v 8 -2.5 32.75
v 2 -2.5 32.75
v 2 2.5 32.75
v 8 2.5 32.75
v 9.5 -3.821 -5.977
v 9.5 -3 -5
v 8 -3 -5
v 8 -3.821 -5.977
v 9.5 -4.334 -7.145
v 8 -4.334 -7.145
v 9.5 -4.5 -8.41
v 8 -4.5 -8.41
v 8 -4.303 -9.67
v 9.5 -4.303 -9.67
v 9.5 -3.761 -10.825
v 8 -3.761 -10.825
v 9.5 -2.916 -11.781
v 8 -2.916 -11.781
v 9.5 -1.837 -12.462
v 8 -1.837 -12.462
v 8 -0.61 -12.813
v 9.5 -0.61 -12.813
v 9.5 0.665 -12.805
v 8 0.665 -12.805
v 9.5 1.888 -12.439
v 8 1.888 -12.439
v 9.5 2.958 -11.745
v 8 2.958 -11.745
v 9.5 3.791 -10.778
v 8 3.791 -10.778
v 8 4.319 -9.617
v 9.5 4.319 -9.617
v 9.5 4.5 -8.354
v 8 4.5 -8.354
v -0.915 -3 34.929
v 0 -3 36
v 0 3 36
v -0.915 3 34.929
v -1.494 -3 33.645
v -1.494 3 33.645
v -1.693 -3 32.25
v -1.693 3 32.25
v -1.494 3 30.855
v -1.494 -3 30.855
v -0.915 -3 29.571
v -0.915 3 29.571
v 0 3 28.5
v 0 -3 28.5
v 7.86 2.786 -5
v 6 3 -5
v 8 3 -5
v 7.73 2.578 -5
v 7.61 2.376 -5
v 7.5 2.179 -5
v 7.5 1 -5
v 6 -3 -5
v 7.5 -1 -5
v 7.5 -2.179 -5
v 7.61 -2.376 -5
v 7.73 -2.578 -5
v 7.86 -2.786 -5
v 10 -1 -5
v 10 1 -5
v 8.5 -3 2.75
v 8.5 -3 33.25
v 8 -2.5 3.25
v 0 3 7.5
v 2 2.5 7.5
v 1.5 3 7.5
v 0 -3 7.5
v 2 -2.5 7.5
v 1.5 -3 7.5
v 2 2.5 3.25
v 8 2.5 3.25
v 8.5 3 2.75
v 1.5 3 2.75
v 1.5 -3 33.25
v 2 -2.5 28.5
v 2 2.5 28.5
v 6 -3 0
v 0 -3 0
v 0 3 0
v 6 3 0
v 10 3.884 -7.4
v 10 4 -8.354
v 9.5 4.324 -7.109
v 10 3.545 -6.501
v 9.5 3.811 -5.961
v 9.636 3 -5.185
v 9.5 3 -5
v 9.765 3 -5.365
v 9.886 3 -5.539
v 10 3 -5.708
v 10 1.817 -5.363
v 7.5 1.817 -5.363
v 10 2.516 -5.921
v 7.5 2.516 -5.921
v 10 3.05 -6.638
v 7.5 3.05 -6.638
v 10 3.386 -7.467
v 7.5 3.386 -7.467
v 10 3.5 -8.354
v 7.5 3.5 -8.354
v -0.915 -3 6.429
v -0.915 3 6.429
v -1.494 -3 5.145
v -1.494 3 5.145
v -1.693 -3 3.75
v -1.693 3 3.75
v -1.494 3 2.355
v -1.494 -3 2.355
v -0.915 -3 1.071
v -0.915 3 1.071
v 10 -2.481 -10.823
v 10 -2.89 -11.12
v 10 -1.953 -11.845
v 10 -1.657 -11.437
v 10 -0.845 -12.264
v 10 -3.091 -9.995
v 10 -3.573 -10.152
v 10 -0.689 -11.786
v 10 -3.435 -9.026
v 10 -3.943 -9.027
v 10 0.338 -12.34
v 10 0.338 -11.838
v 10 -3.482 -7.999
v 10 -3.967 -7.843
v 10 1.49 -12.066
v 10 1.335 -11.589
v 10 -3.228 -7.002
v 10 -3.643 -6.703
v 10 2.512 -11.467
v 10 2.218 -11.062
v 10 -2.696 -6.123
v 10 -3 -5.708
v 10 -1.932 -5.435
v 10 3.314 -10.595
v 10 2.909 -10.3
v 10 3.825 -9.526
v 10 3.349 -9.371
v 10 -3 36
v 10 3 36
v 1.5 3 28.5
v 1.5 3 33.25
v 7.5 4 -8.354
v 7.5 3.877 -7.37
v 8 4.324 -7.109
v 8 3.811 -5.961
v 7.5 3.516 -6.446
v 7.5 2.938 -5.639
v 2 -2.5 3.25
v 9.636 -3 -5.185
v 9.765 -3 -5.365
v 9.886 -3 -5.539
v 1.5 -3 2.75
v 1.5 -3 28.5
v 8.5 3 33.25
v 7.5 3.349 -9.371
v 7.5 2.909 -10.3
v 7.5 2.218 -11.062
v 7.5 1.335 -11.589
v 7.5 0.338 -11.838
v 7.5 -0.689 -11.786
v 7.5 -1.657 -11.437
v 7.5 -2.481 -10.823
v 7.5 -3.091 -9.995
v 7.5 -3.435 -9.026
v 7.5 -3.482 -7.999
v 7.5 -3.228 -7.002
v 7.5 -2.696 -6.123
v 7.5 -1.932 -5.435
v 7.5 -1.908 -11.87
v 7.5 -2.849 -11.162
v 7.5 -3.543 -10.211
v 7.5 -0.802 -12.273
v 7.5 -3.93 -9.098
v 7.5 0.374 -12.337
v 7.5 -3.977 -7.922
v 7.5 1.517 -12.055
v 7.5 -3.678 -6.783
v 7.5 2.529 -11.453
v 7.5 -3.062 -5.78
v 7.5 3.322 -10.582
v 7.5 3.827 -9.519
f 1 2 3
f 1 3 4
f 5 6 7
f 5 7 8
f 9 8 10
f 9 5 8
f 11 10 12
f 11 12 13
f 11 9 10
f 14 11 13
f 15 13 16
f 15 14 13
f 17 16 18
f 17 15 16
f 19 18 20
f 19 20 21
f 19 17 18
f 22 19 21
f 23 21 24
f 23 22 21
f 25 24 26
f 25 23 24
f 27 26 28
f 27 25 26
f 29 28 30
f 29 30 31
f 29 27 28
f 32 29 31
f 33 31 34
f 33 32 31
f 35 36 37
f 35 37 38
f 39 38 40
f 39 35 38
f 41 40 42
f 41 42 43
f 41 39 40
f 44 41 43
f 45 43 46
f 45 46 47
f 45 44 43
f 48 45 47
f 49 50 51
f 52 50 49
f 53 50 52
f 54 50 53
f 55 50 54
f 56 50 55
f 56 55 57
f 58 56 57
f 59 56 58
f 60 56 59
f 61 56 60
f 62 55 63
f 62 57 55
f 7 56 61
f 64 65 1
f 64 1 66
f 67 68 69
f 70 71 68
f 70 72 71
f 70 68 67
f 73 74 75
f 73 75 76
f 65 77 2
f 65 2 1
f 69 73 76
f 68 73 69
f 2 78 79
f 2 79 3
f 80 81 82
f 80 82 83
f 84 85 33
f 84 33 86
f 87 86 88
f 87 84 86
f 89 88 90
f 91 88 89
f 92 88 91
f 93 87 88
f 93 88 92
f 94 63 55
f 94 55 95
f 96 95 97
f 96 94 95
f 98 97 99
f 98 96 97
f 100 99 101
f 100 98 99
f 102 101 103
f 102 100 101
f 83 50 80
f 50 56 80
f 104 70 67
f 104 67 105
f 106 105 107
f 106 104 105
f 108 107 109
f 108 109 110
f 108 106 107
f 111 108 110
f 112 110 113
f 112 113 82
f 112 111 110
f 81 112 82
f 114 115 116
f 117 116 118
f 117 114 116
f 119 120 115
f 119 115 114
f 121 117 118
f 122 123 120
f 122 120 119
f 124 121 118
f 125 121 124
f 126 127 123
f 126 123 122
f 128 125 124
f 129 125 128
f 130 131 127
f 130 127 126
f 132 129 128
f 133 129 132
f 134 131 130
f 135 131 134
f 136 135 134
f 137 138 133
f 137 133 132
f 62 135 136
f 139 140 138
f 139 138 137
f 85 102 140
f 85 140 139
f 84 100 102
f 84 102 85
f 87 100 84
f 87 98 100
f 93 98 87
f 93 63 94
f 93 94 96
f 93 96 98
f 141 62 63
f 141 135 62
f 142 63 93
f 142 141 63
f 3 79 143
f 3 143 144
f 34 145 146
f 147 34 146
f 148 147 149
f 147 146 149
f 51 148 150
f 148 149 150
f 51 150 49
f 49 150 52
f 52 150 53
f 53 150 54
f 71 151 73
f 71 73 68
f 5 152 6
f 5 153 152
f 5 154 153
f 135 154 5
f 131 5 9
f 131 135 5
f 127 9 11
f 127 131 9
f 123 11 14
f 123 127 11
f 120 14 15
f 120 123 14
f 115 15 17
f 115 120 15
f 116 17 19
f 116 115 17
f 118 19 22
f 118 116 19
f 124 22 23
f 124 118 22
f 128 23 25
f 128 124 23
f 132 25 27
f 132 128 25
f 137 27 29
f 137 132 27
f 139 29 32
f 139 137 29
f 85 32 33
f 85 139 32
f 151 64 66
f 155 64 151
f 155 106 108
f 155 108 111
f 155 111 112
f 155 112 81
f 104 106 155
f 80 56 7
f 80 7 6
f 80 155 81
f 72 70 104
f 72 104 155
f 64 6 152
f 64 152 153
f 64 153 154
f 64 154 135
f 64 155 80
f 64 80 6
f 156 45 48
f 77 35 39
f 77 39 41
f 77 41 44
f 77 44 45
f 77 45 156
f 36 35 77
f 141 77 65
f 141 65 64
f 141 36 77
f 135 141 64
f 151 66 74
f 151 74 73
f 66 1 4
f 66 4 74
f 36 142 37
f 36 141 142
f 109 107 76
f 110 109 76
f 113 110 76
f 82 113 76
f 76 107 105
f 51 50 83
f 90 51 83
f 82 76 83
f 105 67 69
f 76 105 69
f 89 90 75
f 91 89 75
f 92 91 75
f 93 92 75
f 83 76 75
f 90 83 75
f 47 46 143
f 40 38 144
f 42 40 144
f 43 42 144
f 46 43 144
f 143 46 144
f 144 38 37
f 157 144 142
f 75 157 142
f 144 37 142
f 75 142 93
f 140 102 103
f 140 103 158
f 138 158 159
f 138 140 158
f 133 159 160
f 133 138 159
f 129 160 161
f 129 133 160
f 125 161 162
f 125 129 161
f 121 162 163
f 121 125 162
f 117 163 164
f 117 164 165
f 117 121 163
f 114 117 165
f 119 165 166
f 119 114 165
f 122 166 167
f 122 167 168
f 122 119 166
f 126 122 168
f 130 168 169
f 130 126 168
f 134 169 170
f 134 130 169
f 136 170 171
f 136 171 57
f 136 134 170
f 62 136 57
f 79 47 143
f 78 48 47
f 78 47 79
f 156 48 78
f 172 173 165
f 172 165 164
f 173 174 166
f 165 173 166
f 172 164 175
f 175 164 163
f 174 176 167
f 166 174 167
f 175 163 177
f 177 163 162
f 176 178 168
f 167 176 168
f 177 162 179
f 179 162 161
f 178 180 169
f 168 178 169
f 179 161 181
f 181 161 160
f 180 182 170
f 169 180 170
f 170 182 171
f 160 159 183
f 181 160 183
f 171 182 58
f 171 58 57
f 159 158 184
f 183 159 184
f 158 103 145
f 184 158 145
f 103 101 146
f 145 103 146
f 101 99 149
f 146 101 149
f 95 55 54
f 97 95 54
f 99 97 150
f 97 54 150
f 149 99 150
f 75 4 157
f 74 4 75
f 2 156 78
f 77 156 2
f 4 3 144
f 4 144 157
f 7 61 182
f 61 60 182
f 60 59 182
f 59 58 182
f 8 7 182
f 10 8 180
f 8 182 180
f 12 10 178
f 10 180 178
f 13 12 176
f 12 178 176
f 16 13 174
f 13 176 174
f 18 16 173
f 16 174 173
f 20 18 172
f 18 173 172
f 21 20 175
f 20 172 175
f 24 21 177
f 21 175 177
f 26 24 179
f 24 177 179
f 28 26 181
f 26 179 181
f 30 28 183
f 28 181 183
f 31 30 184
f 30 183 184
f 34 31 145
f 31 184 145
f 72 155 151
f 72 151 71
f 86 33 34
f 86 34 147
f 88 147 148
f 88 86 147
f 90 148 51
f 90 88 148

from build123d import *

# Parameters (mm, degrees)
F0_W     = 4
F0_H     = 5
F1_DEPTH = 3
F3_DEPTH = 2.5
F4_SIZE  = 0.5
F5_SIZE  = 0.5
F6_SIZE  = 0.5


with BuildPart() as f1:
    # F0 (on Front) → F1 (new body, symmetric)
    with BuildSketch(Plane.XZ):
        Polygon((6, 0), (10, 0), (10, 36), (0, 36), (0, 28.5), (2, 28.5), (2, 32.75), (8, 32.75), (8, 3.25), (2, 3.25), (2, 7.5), (0, 7.5), (0, 0), align=None)
        with BuildLine():
            ThreePointArc((0, 7.5), (-1.692811, 3.75), (0, 0))
            Line((0, 0), (0, 7.5))
        make_face()
        with BuildLine():
            Line((0, 28.5), (0, 36))
            ThreePointArc((0, 36), (-1.692811, 32.25), (0, 28.5))
        make_face()
        with Locations((8, -2.5)):
            Rectangle(F0_W, F0_H)
    extrude(amount=F1_DEPTH, both=True)

    # F2 (on face) → F3 (join)
    with BuildSketch(Plane.YZ.offset(10)):
        with BuildLine():
            ThreePointArc((-3, -5), (-1.837117, -12.462021), (4.5, -8.354102))
            ThreePointArc((4.5, -8.354102), (4.107919, -6.516985), (3, -5))
            Line((3, -5), (1, -5))
            ThreePointArc((1, -5), (2.806243, -6.262452), (3.5, -8.354102))
            ThreePointArc((3.5, -8.354102), (-2.09165, -11.160345), (-1, -5))
            Line((-1, -5), (-3, -5))
        make_face()
    extrude(amount=-F3_DEPTH)

    # F4
    f4_edges = [f1.edges().sort_by_distance(p)[0] for p in [
        (7.5, -1.837117, -12.462021),
    ]]
    chamfer(f4_edges, length=F4_SIZE)

    # F5
    f5_edges = [f1.edges().sort_by_distance(p)[0] for p in [
        (10, -1.837117, -12.462021),
    ]]
    chamfer(f5_edges, length=F5_SIZE)

    # F6
    f6_edges = [f1.edges().sort_by_distance(p)[0] for p in [
        (2, -3, 5.375),
        (5, -3, 3.25),
        (8, -3, 18),
        (2, -3, 30.625),
        (5, -3, 32.75),
        (2, 3, 5.375),
        (5, 3, 3.25),
        (8, 3, 18),
        (5, 3, 32.75),
        (2, 3, 30.625),
    ]]
    chamfer(f6_edges, length=F6_SIZE)


solid = f1.part
